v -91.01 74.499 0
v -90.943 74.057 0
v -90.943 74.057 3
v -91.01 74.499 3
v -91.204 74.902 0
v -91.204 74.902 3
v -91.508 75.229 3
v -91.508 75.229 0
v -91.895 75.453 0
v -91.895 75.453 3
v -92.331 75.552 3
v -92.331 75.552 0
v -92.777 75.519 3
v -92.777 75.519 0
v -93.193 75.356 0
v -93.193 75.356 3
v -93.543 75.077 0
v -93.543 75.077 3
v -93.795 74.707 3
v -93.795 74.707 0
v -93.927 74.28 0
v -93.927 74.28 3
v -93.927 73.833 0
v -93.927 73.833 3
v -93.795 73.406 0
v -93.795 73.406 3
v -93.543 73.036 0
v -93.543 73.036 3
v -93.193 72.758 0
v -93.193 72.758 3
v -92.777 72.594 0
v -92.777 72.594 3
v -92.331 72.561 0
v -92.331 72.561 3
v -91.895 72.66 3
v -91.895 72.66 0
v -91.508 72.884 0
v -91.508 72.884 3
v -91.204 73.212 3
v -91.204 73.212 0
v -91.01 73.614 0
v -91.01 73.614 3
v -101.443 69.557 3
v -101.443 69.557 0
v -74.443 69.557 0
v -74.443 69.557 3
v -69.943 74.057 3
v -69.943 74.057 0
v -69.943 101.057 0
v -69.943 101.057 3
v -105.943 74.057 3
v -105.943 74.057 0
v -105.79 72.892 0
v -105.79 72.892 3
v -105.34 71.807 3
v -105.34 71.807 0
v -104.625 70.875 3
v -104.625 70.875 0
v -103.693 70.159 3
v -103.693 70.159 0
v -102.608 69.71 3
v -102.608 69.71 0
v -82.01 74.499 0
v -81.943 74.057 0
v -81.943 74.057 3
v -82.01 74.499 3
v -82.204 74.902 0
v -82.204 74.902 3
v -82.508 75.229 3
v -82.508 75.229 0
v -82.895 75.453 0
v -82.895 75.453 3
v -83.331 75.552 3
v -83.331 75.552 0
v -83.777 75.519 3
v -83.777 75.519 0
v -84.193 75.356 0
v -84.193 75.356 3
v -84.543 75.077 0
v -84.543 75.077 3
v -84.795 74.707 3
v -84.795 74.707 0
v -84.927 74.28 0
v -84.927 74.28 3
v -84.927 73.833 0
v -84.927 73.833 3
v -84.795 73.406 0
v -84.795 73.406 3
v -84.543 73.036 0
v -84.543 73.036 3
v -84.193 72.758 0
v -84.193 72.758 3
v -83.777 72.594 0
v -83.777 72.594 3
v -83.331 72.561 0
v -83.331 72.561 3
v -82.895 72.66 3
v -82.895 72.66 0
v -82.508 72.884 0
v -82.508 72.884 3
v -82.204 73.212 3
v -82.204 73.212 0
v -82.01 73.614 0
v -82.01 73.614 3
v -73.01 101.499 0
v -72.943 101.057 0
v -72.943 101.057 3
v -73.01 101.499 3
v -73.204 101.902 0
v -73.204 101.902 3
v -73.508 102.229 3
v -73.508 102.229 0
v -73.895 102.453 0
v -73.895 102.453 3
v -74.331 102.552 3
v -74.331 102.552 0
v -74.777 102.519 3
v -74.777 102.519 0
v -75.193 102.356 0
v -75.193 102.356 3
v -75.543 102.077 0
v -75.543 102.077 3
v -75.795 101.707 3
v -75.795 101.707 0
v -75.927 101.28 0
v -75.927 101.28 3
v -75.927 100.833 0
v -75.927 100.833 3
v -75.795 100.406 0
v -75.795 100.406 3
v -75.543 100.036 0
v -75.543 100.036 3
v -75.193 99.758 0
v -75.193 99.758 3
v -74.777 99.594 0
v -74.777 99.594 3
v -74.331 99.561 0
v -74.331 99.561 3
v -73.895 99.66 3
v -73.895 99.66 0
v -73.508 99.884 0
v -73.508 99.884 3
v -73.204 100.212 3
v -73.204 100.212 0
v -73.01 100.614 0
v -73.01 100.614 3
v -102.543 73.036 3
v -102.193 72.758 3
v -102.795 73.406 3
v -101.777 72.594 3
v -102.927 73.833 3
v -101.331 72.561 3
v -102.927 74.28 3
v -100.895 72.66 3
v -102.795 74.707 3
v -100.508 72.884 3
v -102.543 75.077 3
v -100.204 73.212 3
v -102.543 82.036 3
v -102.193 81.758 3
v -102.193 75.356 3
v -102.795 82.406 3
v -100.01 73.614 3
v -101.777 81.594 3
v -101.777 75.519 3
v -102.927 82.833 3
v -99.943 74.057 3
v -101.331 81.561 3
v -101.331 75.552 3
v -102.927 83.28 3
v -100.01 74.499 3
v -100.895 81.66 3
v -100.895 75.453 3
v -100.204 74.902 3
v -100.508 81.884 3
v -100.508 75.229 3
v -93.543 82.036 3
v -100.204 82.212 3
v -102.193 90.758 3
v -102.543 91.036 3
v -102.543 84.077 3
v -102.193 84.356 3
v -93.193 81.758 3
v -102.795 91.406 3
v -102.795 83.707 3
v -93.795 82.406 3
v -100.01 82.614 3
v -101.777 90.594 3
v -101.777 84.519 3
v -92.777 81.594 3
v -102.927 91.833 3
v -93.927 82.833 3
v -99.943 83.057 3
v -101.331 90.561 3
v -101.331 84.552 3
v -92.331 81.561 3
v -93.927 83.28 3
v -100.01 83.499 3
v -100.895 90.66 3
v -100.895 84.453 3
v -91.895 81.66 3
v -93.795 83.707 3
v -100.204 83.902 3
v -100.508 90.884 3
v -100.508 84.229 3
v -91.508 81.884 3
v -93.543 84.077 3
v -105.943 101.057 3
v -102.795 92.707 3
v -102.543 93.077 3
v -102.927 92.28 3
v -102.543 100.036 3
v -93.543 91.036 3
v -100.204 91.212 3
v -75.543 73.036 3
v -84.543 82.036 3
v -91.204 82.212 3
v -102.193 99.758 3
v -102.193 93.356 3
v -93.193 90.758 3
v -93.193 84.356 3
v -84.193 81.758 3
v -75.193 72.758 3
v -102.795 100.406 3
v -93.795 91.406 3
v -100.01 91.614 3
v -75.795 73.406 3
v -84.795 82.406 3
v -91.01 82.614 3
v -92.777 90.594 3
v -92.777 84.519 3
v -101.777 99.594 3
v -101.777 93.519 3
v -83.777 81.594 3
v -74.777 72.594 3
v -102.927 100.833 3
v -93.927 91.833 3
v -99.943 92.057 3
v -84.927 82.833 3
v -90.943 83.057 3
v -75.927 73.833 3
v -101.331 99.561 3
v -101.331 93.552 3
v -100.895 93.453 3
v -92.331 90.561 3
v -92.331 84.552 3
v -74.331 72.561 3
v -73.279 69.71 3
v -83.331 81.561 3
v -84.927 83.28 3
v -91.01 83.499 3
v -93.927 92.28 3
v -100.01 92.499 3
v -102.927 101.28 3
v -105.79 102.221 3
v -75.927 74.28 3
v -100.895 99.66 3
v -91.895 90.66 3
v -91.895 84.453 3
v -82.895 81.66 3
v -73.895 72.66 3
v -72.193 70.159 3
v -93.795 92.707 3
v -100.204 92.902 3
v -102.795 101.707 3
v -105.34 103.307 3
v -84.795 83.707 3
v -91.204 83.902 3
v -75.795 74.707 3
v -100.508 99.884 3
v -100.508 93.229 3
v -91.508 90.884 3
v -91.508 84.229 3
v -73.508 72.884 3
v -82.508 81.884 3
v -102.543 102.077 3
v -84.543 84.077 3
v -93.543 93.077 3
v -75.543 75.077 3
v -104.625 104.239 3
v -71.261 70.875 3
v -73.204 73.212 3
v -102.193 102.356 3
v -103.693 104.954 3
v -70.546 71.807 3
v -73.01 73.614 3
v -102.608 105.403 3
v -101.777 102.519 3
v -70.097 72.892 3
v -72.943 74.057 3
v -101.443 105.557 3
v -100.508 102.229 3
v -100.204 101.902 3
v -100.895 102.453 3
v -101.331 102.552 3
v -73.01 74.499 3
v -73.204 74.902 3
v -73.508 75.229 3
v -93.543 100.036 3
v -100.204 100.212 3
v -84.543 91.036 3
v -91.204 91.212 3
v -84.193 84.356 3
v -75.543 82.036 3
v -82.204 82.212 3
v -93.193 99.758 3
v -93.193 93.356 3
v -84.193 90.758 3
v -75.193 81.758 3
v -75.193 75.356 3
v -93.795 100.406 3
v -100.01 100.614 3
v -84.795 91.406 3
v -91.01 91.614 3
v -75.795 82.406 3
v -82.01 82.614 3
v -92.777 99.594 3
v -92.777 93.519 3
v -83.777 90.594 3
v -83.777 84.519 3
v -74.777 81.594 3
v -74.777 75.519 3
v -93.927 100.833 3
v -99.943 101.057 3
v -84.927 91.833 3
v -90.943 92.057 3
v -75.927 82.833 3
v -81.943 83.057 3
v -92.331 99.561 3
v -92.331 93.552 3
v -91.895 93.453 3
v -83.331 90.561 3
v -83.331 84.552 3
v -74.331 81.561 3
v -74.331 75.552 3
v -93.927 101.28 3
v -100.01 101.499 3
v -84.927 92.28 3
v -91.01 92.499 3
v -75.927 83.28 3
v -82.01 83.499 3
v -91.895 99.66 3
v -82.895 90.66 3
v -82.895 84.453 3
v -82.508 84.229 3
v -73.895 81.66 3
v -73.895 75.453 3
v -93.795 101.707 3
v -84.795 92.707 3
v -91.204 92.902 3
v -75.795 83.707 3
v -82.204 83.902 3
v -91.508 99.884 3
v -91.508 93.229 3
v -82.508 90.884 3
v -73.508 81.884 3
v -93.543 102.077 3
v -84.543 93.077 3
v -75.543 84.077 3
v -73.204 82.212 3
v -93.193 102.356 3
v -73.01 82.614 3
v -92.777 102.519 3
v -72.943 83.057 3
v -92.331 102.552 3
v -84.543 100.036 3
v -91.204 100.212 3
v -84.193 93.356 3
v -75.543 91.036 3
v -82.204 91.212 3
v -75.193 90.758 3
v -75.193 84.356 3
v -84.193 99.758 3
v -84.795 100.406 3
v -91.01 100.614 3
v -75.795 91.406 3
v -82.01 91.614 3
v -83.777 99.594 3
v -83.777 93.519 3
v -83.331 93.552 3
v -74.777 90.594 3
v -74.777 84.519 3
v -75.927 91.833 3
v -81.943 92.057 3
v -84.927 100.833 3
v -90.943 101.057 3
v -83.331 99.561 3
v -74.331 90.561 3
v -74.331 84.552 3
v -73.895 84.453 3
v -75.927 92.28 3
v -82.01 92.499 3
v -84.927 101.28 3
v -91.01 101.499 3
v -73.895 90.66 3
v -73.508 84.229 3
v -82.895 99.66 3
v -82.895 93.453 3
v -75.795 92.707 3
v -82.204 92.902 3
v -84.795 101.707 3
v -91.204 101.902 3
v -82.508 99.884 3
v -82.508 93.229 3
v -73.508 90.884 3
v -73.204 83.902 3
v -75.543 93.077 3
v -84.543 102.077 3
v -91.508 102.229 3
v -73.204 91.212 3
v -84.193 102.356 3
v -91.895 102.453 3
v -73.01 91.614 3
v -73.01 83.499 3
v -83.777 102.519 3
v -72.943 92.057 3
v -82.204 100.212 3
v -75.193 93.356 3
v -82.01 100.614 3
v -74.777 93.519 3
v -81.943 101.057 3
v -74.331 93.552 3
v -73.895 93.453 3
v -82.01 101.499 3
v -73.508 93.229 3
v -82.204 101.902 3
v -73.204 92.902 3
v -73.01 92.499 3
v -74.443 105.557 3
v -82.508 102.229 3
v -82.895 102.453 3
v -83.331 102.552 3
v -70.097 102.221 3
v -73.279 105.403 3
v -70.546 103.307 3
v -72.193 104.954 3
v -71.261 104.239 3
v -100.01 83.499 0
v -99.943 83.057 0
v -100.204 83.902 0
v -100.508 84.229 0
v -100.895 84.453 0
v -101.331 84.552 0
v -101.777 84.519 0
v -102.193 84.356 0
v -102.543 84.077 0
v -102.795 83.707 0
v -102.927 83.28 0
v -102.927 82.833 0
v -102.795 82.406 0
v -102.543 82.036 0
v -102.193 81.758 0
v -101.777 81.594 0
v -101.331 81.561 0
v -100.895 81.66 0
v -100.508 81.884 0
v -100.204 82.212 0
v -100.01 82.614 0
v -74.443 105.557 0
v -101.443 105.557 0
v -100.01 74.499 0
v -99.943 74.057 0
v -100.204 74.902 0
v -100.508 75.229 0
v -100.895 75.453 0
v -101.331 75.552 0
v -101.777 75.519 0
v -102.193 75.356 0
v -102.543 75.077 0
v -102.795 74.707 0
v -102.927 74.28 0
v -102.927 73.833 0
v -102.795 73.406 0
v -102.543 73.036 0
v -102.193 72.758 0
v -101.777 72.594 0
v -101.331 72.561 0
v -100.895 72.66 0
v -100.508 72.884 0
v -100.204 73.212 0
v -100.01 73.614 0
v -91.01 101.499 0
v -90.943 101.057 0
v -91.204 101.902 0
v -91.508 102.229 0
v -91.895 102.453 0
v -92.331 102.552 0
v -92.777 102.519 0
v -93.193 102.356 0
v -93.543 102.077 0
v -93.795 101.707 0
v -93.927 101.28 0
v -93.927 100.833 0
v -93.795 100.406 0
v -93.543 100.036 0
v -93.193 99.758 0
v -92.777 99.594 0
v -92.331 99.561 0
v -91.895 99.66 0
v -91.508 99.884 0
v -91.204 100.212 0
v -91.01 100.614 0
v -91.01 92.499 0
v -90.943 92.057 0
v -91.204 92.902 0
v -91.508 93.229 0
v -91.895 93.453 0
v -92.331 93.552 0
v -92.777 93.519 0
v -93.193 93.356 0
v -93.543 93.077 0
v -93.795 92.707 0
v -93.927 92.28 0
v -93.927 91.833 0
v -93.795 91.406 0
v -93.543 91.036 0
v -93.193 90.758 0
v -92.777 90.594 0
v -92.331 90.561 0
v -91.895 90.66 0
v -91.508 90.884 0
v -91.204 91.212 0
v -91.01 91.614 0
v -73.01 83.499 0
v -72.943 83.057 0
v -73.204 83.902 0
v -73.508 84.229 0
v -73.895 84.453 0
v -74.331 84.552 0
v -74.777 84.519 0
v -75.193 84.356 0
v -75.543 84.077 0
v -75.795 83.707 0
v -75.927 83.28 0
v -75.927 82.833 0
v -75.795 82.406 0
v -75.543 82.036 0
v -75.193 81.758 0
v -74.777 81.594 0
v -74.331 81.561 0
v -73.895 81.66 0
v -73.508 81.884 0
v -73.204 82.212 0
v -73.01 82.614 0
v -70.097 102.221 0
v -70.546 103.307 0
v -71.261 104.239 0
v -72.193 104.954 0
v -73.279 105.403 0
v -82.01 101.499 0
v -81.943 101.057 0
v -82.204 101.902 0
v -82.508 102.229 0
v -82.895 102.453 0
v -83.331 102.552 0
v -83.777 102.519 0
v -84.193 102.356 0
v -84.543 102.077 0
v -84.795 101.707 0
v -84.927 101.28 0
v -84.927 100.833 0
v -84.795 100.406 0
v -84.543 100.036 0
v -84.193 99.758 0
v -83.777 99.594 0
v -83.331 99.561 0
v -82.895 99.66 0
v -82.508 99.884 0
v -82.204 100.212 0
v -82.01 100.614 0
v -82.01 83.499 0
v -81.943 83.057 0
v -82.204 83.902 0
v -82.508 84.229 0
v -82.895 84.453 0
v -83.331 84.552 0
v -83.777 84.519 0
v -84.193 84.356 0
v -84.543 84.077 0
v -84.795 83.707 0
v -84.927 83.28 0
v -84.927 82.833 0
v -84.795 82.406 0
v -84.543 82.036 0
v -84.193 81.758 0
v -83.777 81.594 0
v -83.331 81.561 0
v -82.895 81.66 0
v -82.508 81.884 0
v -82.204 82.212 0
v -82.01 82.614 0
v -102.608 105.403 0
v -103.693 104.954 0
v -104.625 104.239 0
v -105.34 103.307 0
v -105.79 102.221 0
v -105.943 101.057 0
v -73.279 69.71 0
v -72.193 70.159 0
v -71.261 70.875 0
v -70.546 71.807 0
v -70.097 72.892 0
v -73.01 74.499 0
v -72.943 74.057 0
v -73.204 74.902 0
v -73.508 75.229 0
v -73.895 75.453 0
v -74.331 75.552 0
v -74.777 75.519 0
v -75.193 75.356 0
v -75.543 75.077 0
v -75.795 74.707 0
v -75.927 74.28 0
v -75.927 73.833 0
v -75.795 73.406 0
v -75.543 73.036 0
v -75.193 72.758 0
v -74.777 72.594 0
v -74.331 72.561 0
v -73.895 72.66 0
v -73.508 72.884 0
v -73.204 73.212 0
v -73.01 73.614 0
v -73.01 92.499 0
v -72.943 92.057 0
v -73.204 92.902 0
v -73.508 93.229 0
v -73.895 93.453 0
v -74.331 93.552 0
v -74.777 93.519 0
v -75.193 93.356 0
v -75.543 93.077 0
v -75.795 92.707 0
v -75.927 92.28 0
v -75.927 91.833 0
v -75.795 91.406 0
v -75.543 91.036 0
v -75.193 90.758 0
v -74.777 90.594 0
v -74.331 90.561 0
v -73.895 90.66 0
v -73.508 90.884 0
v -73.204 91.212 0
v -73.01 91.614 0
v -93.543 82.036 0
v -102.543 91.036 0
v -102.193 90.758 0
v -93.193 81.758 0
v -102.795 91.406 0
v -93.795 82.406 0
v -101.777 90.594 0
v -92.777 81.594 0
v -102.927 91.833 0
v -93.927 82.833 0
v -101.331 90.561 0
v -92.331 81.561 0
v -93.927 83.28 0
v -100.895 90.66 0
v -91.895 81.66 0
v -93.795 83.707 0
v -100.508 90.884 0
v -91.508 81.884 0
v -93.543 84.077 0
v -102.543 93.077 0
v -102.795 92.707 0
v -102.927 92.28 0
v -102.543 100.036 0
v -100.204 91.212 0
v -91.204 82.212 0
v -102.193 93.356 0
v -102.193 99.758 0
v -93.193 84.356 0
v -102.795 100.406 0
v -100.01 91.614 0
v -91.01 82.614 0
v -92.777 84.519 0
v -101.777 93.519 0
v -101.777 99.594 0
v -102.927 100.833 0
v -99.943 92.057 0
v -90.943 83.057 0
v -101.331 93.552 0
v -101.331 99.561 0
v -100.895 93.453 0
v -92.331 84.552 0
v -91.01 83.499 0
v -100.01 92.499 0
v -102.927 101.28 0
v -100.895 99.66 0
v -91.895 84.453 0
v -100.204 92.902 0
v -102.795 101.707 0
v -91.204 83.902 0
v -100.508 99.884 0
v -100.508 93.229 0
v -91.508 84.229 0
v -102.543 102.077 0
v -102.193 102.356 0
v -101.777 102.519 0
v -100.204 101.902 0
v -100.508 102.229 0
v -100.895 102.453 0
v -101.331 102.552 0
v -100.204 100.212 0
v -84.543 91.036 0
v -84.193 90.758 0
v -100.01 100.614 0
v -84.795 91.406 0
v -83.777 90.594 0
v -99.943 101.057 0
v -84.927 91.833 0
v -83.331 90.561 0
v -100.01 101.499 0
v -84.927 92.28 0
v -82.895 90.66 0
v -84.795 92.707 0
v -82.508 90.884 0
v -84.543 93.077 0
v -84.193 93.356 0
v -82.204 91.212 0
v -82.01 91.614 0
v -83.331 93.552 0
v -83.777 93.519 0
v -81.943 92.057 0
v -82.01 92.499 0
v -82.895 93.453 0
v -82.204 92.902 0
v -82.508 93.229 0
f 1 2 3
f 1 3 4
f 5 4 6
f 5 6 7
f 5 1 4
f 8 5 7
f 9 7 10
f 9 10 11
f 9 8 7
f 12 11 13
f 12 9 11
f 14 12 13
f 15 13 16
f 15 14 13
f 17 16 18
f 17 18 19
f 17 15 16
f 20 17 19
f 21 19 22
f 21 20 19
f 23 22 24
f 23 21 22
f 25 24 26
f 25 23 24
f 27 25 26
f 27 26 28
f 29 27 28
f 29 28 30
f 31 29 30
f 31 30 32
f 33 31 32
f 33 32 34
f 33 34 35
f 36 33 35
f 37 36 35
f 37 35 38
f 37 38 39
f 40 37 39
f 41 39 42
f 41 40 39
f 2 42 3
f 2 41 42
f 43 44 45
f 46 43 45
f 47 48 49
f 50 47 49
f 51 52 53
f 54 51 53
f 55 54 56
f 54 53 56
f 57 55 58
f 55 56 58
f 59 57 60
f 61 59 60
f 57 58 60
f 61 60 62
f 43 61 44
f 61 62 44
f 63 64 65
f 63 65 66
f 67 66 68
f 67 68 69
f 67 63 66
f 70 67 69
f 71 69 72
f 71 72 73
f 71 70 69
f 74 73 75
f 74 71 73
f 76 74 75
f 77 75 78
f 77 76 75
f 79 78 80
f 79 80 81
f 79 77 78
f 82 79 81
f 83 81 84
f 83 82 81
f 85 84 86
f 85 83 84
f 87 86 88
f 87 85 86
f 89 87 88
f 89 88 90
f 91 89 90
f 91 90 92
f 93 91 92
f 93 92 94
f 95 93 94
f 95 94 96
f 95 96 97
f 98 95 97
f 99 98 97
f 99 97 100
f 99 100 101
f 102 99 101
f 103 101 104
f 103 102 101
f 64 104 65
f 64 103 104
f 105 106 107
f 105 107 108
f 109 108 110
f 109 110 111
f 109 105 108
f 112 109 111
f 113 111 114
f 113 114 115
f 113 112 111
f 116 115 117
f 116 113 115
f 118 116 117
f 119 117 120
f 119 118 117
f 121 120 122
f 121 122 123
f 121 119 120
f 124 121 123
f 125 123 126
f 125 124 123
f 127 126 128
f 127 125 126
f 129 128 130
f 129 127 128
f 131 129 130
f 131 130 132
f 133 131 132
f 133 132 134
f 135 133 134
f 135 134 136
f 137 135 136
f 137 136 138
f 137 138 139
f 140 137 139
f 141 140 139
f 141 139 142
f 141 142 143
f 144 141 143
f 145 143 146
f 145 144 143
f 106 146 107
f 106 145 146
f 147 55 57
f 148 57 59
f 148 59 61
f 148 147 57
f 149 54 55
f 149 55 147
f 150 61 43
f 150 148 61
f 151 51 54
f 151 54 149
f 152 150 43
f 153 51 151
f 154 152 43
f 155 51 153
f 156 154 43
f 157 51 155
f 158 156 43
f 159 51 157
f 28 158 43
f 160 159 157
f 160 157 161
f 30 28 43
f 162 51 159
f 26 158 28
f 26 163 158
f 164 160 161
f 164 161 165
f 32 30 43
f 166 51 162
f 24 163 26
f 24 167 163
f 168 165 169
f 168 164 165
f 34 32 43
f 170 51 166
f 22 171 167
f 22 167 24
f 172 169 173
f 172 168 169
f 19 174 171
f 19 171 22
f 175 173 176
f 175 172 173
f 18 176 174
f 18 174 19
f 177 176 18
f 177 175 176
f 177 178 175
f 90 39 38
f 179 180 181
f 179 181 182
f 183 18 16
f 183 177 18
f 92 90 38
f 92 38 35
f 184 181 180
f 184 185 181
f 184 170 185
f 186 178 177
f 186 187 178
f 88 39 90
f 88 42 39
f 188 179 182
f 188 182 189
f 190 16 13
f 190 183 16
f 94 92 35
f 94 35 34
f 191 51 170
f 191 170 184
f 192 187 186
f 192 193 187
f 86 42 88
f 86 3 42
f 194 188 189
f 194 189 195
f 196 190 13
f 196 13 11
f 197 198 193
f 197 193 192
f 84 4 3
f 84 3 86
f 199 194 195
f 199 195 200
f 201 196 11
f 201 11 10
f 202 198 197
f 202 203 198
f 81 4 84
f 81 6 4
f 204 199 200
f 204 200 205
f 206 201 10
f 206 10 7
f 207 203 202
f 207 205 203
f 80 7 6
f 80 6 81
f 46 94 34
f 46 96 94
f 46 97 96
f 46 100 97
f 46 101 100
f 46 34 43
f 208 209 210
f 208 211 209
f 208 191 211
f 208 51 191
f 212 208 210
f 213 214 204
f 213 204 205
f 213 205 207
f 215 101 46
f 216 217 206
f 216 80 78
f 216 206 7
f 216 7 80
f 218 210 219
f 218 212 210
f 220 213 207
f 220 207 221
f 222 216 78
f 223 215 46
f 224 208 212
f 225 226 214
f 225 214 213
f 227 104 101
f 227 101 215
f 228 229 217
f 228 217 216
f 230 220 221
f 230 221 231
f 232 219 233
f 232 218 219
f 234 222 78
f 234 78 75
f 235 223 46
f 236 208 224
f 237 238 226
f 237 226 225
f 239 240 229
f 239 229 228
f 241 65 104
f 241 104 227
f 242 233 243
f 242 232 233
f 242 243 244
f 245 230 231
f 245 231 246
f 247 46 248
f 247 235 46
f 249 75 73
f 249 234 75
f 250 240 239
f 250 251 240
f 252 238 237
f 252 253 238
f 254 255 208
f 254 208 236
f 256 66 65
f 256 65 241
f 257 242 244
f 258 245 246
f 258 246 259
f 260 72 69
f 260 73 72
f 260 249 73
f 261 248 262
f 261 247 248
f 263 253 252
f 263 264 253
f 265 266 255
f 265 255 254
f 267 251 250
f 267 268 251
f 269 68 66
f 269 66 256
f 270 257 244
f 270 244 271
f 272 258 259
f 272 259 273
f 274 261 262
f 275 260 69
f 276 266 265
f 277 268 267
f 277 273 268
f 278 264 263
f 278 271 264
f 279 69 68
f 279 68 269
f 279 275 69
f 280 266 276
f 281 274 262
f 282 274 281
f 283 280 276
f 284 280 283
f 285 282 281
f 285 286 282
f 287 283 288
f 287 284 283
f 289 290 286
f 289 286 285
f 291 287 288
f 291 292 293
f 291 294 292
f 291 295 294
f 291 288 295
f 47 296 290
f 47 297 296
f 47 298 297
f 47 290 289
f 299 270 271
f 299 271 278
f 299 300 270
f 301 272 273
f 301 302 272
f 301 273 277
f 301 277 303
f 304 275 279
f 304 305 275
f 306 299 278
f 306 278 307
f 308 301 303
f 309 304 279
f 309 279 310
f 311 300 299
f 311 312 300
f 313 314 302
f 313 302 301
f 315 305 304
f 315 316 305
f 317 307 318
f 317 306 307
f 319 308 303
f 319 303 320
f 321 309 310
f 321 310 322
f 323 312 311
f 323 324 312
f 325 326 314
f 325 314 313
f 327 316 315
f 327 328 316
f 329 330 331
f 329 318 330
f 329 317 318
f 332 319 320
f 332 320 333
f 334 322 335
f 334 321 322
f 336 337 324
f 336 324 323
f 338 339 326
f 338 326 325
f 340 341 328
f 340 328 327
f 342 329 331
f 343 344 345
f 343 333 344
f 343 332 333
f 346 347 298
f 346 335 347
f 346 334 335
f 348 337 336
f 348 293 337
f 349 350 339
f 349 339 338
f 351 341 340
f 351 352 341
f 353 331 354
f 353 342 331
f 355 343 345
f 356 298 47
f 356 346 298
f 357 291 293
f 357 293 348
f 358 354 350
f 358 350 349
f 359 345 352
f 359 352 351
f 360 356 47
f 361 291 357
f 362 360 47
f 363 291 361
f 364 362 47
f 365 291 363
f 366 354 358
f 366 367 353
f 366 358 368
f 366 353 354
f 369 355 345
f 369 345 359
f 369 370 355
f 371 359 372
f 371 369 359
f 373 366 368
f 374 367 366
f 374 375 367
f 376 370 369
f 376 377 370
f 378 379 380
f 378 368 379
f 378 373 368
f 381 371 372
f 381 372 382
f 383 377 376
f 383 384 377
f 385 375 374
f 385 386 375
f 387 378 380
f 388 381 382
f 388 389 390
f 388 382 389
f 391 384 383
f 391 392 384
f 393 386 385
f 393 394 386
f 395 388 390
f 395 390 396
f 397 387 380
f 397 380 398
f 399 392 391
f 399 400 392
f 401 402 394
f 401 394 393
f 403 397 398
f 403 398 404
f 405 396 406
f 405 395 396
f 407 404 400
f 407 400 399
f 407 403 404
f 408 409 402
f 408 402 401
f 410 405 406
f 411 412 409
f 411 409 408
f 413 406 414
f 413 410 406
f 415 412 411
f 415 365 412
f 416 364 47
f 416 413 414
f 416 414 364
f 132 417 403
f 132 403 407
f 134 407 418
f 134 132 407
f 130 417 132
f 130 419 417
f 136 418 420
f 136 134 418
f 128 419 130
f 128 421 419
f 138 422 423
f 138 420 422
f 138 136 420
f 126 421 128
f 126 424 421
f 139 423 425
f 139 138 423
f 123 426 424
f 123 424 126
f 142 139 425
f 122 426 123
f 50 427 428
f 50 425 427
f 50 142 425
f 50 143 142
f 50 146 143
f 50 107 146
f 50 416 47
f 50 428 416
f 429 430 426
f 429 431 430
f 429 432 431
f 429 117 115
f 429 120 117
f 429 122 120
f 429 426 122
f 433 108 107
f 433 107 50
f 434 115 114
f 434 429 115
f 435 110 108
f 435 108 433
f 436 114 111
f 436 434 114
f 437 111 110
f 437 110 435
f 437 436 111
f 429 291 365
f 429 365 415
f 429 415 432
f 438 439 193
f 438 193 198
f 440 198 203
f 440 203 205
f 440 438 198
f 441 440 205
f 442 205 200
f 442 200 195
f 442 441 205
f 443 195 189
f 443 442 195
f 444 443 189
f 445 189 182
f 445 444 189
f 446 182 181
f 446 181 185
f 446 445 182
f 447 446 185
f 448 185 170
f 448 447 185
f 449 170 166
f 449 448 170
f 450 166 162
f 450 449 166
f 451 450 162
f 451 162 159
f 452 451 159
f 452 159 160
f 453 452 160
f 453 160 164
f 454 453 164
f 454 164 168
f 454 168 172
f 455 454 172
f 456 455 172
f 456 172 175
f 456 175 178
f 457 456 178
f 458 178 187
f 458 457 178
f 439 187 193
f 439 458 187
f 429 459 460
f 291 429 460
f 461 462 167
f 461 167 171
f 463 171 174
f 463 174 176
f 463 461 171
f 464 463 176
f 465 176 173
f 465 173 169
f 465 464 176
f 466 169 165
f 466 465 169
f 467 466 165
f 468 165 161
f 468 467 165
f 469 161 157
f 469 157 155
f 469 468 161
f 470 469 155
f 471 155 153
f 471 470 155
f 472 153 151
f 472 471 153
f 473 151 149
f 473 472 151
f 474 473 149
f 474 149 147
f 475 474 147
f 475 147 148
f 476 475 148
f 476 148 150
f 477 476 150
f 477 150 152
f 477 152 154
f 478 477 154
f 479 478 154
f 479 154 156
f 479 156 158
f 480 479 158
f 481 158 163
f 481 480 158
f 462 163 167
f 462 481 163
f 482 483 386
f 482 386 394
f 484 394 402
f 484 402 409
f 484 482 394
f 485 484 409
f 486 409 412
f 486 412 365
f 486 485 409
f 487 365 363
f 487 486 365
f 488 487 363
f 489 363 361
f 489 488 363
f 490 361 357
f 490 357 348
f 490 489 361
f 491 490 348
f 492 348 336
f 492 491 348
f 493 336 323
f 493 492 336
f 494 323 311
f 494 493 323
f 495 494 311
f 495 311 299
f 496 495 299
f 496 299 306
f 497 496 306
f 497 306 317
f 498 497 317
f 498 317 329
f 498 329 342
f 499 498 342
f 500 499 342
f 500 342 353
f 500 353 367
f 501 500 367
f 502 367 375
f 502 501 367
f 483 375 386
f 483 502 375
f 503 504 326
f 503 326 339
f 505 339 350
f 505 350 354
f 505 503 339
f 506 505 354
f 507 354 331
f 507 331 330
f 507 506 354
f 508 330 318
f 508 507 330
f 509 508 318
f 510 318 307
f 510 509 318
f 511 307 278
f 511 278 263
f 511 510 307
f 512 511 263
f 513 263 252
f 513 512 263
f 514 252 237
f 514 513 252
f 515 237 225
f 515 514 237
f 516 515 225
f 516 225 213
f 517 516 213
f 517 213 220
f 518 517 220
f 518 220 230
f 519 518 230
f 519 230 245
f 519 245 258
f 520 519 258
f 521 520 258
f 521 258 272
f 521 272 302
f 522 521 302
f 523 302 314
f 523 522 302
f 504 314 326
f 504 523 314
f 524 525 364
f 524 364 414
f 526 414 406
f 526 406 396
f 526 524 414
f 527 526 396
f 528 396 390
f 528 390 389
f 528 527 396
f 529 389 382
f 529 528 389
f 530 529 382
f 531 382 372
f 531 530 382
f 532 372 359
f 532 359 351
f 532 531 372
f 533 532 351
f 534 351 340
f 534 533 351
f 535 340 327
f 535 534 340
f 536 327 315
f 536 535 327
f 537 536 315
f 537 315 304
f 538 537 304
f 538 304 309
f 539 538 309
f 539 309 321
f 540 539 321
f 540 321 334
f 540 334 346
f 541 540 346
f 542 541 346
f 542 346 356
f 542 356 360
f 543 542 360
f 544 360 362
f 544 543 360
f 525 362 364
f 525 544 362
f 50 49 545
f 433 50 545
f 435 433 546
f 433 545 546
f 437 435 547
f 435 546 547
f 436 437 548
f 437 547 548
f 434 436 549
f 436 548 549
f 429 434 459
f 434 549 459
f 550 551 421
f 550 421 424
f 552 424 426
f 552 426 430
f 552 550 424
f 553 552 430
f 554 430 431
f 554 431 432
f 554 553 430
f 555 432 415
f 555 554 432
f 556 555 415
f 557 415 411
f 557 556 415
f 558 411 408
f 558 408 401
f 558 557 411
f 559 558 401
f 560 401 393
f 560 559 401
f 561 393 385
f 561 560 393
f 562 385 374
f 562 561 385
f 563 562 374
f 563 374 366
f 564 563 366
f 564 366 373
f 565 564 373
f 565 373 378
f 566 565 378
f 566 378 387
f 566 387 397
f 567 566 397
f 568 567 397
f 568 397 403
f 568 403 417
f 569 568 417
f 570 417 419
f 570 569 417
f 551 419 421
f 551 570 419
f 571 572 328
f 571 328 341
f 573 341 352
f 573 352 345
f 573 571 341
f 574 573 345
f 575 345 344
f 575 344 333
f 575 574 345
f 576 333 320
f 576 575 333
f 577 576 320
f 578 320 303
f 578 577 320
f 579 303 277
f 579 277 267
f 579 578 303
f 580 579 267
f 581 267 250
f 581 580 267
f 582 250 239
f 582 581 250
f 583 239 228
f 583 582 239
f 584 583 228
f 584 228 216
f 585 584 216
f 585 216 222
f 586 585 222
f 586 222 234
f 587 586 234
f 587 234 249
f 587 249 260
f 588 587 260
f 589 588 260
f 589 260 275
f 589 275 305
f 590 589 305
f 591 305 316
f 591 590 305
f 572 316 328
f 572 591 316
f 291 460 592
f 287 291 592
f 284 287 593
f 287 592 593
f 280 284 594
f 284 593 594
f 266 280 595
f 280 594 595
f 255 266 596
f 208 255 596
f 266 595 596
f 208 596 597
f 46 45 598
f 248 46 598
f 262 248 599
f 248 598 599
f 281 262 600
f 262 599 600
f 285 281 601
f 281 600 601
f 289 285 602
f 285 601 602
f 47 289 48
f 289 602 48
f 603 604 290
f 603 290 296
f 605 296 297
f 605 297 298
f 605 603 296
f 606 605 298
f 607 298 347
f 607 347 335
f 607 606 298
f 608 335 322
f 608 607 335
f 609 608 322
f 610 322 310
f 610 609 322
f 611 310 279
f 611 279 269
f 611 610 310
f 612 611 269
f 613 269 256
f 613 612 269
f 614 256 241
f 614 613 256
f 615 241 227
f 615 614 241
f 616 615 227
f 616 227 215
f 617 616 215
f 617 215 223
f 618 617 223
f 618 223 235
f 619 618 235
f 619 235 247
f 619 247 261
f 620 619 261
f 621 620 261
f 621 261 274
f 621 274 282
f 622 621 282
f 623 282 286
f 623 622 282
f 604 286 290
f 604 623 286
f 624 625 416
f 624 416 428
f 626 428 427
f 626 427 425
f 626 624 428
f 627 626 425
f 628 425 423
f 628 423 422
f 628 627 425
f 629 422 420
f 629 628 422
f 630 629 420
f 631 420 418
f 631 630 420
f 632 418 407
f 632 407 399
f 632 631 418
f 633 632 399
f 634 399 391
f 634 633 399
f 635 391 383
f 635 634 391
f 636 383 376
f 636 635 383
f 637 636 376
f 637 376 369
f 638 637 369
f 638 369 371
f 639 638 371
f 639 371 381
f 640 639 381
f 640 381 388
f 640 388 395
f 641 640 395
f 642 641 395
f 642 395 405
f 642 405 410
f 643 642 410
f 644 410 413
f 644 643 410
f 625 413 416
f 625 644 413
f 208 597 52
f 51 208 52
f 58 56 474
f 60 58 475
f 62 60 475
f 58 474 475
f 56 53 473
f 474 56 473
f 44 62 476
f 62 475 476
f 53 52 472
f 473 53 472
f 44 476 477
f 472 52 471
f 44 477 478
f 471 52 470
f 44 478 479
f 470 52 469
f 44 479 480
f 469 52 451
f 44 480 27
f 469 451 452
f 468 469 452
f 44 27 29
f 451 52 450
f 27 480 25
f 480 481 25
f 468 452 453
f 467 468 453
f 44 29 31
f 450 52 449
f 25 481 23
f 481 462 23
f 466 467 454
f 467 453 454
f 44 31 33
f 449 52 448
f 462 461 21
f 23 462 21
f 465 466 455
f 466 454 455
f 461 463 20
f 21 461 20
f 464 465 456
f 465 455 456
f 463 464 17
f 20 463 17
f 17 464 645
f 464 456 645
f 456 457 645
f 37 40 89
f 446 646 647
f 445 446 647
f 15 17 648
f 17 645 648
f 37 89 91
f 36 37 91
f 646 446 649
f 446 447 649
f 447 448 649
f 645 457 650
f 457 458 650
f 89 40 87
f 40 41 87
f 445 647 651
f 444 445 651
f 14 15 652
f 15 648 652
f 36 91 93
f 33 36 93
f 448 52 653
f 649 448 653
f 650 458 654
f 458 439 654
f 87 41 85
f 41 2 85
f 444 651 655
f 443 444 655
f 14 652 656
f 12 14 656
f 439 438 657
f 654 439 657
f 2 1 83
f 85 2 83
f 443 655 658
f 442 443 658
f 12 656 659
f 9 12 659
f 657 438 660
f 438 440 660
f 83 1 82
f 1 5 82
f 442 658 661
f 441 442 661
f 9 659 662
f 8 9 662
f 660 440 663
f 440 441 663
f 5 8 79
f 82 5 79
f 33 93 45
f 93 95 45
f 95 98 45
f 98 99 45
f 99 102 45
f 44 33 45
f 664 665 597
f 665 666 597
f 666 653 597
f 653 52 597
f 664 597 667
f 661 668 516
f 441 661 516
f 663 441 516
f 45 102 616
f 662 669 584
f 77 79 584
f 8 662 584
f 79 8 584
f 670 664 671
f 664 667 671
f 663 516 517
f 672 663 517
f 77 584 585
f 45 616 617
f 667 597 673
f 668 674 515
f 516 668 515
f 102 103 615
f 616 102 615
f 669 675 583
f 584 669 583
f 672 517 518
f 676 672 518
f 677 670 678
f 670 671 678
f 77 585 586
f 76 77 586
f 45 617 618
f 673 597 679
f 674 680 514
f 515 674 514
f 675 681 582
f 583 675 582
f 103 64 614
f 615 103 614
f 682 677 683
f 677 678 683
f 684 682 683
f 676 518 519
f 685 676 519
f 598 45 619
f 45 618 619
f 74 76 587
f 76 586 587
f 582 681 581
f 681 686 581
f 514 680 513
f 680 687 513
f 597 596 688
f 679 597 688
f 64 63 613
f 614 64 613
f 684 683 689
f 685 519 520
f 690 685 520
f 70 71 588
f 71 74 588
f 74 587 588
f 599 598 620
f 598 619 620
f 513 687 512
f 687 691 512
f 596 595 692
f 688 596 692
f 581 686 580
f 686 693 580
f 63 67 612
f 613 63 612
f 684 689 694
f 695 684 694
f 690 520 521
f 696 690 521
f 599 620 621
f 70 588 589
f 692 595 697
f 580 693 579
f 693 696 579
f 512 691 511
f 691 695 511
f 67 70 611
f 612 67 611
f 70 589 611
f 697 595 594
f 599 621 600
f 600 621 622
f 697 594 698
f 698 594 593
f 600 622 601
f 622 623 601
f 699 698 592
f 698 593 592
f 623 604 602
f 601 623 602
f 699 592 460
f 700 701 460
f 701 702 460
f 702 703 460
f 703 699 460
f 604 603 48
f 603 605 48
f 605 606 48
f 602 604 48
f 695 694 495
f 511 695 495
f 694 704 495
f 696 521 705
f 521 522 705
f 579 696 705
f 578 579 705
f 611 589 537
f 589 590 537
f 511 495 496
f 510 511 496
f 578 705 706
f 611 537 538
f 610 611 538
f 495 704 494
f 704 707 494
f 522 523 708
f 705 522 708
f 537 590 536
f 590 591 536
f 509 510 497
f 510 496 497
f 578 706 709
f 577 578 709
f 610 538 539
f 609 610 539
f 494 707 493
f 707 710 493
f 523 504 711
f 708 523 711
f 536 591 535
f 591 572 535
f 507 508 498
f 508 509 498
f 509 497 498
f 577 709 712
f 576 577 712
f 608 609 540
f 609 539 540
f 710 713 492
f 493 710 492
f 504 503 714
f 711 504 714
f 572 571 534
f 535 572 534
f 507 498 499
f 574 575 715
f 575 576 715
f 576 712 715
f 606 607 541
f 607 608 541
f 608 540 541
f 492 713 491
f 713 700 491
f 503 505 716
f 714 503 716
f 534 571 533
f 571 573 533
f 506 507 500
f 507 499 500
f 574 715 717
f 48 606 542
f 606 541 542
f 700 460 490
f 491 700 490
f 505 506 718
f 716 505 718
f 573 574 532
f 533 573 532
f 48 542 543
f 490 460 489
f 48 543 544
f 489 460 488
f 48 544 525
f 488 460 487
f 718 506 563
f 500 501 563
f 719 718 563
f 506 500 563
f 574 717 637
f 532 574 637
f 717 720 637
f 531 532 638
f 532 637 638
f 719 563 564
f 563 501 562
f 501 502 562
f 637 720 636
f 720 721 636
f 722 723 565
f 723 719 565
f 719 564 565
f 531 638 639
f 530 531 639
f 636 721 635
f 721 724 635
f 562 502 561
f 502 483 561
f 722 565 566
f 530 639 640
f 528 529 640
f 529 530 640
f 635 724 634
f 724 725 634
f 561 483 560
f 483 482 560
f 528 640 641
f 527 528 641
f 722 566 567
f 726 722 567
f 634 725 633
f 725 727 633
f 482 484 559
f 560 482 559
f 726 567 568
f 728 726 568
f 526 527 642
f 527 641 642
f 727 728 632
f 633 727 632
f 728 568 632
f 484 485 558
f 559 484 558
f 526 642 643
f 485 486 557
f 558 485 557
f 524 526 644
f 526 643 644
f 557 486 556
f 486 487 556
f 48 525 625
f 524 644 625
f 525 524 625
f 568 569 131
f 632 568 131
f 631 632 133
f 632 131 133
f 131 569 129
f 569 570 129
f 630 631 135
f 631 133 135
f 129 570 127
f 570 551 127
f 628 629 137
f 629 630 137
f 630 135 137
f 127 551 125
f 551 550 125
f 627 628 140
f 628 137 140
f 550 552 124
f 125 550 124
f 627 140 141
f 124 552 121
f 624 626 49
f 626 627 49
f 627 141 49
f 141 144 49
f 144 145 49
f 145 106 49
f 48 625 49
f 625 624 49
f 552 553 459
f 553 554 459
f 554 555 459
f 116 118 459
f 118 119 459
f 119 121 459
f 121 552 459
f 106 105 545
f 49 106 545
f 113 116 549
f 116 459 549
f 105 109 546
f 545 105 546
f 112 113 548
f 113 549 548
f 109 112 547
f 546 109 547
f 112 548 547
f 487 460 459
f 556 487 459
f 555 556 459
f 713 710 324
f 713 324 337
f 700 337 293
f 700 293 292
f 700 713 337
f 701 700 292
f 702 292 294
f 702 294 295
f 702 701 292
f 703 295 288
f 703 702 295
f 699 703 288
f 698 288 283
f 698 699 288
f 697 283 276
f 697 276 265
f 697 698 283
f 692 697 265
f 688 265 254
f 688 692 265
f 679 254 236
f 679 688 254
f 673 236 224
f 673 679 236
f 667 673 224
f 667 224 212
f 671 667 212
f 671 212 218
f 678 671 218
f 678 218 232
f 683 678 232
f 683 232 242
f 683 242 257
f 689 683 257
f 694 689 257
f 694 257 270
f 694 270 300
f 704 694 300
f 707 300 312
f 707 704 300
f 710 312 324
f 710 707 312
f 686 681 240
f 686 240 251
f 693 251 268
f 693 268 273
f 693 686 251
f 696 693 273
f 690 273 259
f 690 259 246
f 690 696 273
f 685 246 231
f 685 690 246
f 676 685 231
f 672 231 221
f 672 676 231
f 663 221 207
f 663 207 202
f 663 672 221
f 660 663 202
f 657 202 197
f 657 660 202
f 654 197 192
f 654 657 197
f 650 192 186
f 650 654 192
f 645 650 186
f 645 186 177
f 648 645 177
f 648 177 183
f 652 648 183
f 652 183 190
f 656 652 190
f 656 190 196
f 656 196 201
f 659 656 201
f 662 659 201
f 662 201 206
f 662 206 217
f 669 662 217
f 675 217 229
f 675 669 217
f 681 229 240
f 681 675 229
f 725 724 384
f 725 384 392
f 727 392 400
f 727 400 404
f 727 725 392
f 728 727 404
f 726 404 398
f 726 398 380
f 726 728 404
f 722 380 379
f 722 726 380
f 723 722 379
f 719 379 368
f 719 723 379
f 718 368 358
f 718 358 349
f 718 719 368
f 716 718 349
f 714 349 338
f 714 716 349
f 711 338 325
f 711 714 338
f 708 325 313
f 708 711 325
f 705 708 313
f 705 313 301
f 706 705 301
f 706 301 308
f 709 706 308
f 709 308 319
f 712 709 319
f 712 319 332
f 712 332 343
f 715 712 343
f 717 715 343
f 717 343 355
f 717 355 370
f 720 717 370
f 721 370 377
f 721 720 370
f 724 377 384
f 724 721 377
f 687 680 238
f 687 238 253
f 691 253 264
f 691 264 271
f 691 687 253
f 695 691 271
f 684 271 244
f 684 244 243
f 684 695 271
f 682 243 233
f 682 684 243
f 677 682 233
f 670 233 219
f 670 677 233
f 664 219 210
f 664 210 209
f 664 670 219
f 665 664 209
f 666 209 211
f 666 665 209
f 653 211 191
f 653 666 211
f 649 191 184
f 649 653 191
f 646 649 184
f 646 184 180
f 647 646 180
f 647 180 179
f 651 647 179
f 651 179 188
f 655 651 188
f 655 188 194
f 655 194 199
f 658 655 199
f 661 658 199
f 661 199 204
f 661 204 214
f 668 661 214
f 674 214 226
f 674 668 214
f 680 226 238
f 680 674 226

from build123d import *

# Parameters (mm, degrees)
MODEL_R                 = 1.5
SALIENTE_EXTRUIR1_DEPTH = 3


with BuildPart() as part:
    # Model → Saliente-Extruir1 (new body)
    with BuildSketch(Plane.XY):
        with BuildLine():
            Line((-105.943383637, 101.056539338), (-105.943383637, 74.056539338))
            ThreePointArc((-105.943383637, 74.056539338), (-104.625364152, 70.874558823), (-101.443383637, 69.556539338))
            Line((-101.443383637, 69.556539338), (-74.443383637, 69.556539338))
            ThreePointArc((-74.443383637, 69.556539338), (-71.261403122, 70.874558823), (-69.943383637, 74.056539338))
            Line((-69.943383637, 74.056539338), (-69.943383637, 101.056539338))
            ThreePointArc((-69.943383637, 101.056539338), (-71.261403122, 104.238519853), (-74.443383637, 105.556539338))
            Line((-74.443383637, 105.556539338), (-101.443383637, 105.556539338))
            ThreePointArc((-101.443383637, 105.556539338), (-104.625364152, 104.238519853), (-105.943383637, 101.056539338))
        make_face()
        with Locations((-101.443383637, 101.056539338)):
            Circle(MODEL_R, mode=Mode.SUBTRACT)
        with Locations((-92.443383637, 101.056539338)):
            Circle(MODEL_R, mode=Mode.SUBTRACT)
        with Locations((-83.443383637, 101.056539338)):
            Circle(MODEL_R, mode=Mode.SUBTRACT)
        with Locations((-74.443383637, 101.056539338)):
            Circle(MODEL_R, mode=Mode.SUBTRACT)
        with Locations((-101.443383637, 92.056539338)):
            Circle(MODEL_R, mode=Mode.SUBTRACT)
        with Locations((-92.443383637, 92.056539338)):
            Circle(MODEL_R, mode=Mode.SUBTRACT)
        with Locations((-83.443383637, 92.056539338)):
            Circle(MODEL_R, mode=Mode.SUBTRACT)
        with Locations((-74.443383637, 92.056539338)):
            Circle(MODEL_R, mode=Mode.SUBTRACT)
        with Locations((-101.443383637, 83.056539338)):
            Circle(MODEL_R, mode=Mode.SUBTRACT)
        with Locations((-92.443383637, 83.056539338)):
            Circle(MODEL_R, mode=Mode.SUBTRACT)
        with Locations((-83.443383637, 83.056539338)):
            Circle(MODEL_R, mode=Mode.SUBTRACT)
        with Locations((-74.443383637, 83.056539338)):
            Circle(MODEL_R, mode=Mode.SUBTRACT)
        with Locations((-101.443383637, 74.056539338)):
            Circle(MODEL_R, mode=Mode.SUBTRACT)
        with Locations((-92.443383637, 74.056539338)):
            Circle(MODEL_R, mode=Mode.SUBTRACT)
        with Locations((-83.443383637, 74.056539338)):
            Circle(MODEL_R, mode=Mode.SUBTRACT)
        with Locations((-74.443383637, 74.056539338)):
            Circle(MODEL_R, mode=Mode.SUBTRACT)
    extrude(amount=SALIENTE_EXTRUIR1_DEPTH)


solid = part.part
